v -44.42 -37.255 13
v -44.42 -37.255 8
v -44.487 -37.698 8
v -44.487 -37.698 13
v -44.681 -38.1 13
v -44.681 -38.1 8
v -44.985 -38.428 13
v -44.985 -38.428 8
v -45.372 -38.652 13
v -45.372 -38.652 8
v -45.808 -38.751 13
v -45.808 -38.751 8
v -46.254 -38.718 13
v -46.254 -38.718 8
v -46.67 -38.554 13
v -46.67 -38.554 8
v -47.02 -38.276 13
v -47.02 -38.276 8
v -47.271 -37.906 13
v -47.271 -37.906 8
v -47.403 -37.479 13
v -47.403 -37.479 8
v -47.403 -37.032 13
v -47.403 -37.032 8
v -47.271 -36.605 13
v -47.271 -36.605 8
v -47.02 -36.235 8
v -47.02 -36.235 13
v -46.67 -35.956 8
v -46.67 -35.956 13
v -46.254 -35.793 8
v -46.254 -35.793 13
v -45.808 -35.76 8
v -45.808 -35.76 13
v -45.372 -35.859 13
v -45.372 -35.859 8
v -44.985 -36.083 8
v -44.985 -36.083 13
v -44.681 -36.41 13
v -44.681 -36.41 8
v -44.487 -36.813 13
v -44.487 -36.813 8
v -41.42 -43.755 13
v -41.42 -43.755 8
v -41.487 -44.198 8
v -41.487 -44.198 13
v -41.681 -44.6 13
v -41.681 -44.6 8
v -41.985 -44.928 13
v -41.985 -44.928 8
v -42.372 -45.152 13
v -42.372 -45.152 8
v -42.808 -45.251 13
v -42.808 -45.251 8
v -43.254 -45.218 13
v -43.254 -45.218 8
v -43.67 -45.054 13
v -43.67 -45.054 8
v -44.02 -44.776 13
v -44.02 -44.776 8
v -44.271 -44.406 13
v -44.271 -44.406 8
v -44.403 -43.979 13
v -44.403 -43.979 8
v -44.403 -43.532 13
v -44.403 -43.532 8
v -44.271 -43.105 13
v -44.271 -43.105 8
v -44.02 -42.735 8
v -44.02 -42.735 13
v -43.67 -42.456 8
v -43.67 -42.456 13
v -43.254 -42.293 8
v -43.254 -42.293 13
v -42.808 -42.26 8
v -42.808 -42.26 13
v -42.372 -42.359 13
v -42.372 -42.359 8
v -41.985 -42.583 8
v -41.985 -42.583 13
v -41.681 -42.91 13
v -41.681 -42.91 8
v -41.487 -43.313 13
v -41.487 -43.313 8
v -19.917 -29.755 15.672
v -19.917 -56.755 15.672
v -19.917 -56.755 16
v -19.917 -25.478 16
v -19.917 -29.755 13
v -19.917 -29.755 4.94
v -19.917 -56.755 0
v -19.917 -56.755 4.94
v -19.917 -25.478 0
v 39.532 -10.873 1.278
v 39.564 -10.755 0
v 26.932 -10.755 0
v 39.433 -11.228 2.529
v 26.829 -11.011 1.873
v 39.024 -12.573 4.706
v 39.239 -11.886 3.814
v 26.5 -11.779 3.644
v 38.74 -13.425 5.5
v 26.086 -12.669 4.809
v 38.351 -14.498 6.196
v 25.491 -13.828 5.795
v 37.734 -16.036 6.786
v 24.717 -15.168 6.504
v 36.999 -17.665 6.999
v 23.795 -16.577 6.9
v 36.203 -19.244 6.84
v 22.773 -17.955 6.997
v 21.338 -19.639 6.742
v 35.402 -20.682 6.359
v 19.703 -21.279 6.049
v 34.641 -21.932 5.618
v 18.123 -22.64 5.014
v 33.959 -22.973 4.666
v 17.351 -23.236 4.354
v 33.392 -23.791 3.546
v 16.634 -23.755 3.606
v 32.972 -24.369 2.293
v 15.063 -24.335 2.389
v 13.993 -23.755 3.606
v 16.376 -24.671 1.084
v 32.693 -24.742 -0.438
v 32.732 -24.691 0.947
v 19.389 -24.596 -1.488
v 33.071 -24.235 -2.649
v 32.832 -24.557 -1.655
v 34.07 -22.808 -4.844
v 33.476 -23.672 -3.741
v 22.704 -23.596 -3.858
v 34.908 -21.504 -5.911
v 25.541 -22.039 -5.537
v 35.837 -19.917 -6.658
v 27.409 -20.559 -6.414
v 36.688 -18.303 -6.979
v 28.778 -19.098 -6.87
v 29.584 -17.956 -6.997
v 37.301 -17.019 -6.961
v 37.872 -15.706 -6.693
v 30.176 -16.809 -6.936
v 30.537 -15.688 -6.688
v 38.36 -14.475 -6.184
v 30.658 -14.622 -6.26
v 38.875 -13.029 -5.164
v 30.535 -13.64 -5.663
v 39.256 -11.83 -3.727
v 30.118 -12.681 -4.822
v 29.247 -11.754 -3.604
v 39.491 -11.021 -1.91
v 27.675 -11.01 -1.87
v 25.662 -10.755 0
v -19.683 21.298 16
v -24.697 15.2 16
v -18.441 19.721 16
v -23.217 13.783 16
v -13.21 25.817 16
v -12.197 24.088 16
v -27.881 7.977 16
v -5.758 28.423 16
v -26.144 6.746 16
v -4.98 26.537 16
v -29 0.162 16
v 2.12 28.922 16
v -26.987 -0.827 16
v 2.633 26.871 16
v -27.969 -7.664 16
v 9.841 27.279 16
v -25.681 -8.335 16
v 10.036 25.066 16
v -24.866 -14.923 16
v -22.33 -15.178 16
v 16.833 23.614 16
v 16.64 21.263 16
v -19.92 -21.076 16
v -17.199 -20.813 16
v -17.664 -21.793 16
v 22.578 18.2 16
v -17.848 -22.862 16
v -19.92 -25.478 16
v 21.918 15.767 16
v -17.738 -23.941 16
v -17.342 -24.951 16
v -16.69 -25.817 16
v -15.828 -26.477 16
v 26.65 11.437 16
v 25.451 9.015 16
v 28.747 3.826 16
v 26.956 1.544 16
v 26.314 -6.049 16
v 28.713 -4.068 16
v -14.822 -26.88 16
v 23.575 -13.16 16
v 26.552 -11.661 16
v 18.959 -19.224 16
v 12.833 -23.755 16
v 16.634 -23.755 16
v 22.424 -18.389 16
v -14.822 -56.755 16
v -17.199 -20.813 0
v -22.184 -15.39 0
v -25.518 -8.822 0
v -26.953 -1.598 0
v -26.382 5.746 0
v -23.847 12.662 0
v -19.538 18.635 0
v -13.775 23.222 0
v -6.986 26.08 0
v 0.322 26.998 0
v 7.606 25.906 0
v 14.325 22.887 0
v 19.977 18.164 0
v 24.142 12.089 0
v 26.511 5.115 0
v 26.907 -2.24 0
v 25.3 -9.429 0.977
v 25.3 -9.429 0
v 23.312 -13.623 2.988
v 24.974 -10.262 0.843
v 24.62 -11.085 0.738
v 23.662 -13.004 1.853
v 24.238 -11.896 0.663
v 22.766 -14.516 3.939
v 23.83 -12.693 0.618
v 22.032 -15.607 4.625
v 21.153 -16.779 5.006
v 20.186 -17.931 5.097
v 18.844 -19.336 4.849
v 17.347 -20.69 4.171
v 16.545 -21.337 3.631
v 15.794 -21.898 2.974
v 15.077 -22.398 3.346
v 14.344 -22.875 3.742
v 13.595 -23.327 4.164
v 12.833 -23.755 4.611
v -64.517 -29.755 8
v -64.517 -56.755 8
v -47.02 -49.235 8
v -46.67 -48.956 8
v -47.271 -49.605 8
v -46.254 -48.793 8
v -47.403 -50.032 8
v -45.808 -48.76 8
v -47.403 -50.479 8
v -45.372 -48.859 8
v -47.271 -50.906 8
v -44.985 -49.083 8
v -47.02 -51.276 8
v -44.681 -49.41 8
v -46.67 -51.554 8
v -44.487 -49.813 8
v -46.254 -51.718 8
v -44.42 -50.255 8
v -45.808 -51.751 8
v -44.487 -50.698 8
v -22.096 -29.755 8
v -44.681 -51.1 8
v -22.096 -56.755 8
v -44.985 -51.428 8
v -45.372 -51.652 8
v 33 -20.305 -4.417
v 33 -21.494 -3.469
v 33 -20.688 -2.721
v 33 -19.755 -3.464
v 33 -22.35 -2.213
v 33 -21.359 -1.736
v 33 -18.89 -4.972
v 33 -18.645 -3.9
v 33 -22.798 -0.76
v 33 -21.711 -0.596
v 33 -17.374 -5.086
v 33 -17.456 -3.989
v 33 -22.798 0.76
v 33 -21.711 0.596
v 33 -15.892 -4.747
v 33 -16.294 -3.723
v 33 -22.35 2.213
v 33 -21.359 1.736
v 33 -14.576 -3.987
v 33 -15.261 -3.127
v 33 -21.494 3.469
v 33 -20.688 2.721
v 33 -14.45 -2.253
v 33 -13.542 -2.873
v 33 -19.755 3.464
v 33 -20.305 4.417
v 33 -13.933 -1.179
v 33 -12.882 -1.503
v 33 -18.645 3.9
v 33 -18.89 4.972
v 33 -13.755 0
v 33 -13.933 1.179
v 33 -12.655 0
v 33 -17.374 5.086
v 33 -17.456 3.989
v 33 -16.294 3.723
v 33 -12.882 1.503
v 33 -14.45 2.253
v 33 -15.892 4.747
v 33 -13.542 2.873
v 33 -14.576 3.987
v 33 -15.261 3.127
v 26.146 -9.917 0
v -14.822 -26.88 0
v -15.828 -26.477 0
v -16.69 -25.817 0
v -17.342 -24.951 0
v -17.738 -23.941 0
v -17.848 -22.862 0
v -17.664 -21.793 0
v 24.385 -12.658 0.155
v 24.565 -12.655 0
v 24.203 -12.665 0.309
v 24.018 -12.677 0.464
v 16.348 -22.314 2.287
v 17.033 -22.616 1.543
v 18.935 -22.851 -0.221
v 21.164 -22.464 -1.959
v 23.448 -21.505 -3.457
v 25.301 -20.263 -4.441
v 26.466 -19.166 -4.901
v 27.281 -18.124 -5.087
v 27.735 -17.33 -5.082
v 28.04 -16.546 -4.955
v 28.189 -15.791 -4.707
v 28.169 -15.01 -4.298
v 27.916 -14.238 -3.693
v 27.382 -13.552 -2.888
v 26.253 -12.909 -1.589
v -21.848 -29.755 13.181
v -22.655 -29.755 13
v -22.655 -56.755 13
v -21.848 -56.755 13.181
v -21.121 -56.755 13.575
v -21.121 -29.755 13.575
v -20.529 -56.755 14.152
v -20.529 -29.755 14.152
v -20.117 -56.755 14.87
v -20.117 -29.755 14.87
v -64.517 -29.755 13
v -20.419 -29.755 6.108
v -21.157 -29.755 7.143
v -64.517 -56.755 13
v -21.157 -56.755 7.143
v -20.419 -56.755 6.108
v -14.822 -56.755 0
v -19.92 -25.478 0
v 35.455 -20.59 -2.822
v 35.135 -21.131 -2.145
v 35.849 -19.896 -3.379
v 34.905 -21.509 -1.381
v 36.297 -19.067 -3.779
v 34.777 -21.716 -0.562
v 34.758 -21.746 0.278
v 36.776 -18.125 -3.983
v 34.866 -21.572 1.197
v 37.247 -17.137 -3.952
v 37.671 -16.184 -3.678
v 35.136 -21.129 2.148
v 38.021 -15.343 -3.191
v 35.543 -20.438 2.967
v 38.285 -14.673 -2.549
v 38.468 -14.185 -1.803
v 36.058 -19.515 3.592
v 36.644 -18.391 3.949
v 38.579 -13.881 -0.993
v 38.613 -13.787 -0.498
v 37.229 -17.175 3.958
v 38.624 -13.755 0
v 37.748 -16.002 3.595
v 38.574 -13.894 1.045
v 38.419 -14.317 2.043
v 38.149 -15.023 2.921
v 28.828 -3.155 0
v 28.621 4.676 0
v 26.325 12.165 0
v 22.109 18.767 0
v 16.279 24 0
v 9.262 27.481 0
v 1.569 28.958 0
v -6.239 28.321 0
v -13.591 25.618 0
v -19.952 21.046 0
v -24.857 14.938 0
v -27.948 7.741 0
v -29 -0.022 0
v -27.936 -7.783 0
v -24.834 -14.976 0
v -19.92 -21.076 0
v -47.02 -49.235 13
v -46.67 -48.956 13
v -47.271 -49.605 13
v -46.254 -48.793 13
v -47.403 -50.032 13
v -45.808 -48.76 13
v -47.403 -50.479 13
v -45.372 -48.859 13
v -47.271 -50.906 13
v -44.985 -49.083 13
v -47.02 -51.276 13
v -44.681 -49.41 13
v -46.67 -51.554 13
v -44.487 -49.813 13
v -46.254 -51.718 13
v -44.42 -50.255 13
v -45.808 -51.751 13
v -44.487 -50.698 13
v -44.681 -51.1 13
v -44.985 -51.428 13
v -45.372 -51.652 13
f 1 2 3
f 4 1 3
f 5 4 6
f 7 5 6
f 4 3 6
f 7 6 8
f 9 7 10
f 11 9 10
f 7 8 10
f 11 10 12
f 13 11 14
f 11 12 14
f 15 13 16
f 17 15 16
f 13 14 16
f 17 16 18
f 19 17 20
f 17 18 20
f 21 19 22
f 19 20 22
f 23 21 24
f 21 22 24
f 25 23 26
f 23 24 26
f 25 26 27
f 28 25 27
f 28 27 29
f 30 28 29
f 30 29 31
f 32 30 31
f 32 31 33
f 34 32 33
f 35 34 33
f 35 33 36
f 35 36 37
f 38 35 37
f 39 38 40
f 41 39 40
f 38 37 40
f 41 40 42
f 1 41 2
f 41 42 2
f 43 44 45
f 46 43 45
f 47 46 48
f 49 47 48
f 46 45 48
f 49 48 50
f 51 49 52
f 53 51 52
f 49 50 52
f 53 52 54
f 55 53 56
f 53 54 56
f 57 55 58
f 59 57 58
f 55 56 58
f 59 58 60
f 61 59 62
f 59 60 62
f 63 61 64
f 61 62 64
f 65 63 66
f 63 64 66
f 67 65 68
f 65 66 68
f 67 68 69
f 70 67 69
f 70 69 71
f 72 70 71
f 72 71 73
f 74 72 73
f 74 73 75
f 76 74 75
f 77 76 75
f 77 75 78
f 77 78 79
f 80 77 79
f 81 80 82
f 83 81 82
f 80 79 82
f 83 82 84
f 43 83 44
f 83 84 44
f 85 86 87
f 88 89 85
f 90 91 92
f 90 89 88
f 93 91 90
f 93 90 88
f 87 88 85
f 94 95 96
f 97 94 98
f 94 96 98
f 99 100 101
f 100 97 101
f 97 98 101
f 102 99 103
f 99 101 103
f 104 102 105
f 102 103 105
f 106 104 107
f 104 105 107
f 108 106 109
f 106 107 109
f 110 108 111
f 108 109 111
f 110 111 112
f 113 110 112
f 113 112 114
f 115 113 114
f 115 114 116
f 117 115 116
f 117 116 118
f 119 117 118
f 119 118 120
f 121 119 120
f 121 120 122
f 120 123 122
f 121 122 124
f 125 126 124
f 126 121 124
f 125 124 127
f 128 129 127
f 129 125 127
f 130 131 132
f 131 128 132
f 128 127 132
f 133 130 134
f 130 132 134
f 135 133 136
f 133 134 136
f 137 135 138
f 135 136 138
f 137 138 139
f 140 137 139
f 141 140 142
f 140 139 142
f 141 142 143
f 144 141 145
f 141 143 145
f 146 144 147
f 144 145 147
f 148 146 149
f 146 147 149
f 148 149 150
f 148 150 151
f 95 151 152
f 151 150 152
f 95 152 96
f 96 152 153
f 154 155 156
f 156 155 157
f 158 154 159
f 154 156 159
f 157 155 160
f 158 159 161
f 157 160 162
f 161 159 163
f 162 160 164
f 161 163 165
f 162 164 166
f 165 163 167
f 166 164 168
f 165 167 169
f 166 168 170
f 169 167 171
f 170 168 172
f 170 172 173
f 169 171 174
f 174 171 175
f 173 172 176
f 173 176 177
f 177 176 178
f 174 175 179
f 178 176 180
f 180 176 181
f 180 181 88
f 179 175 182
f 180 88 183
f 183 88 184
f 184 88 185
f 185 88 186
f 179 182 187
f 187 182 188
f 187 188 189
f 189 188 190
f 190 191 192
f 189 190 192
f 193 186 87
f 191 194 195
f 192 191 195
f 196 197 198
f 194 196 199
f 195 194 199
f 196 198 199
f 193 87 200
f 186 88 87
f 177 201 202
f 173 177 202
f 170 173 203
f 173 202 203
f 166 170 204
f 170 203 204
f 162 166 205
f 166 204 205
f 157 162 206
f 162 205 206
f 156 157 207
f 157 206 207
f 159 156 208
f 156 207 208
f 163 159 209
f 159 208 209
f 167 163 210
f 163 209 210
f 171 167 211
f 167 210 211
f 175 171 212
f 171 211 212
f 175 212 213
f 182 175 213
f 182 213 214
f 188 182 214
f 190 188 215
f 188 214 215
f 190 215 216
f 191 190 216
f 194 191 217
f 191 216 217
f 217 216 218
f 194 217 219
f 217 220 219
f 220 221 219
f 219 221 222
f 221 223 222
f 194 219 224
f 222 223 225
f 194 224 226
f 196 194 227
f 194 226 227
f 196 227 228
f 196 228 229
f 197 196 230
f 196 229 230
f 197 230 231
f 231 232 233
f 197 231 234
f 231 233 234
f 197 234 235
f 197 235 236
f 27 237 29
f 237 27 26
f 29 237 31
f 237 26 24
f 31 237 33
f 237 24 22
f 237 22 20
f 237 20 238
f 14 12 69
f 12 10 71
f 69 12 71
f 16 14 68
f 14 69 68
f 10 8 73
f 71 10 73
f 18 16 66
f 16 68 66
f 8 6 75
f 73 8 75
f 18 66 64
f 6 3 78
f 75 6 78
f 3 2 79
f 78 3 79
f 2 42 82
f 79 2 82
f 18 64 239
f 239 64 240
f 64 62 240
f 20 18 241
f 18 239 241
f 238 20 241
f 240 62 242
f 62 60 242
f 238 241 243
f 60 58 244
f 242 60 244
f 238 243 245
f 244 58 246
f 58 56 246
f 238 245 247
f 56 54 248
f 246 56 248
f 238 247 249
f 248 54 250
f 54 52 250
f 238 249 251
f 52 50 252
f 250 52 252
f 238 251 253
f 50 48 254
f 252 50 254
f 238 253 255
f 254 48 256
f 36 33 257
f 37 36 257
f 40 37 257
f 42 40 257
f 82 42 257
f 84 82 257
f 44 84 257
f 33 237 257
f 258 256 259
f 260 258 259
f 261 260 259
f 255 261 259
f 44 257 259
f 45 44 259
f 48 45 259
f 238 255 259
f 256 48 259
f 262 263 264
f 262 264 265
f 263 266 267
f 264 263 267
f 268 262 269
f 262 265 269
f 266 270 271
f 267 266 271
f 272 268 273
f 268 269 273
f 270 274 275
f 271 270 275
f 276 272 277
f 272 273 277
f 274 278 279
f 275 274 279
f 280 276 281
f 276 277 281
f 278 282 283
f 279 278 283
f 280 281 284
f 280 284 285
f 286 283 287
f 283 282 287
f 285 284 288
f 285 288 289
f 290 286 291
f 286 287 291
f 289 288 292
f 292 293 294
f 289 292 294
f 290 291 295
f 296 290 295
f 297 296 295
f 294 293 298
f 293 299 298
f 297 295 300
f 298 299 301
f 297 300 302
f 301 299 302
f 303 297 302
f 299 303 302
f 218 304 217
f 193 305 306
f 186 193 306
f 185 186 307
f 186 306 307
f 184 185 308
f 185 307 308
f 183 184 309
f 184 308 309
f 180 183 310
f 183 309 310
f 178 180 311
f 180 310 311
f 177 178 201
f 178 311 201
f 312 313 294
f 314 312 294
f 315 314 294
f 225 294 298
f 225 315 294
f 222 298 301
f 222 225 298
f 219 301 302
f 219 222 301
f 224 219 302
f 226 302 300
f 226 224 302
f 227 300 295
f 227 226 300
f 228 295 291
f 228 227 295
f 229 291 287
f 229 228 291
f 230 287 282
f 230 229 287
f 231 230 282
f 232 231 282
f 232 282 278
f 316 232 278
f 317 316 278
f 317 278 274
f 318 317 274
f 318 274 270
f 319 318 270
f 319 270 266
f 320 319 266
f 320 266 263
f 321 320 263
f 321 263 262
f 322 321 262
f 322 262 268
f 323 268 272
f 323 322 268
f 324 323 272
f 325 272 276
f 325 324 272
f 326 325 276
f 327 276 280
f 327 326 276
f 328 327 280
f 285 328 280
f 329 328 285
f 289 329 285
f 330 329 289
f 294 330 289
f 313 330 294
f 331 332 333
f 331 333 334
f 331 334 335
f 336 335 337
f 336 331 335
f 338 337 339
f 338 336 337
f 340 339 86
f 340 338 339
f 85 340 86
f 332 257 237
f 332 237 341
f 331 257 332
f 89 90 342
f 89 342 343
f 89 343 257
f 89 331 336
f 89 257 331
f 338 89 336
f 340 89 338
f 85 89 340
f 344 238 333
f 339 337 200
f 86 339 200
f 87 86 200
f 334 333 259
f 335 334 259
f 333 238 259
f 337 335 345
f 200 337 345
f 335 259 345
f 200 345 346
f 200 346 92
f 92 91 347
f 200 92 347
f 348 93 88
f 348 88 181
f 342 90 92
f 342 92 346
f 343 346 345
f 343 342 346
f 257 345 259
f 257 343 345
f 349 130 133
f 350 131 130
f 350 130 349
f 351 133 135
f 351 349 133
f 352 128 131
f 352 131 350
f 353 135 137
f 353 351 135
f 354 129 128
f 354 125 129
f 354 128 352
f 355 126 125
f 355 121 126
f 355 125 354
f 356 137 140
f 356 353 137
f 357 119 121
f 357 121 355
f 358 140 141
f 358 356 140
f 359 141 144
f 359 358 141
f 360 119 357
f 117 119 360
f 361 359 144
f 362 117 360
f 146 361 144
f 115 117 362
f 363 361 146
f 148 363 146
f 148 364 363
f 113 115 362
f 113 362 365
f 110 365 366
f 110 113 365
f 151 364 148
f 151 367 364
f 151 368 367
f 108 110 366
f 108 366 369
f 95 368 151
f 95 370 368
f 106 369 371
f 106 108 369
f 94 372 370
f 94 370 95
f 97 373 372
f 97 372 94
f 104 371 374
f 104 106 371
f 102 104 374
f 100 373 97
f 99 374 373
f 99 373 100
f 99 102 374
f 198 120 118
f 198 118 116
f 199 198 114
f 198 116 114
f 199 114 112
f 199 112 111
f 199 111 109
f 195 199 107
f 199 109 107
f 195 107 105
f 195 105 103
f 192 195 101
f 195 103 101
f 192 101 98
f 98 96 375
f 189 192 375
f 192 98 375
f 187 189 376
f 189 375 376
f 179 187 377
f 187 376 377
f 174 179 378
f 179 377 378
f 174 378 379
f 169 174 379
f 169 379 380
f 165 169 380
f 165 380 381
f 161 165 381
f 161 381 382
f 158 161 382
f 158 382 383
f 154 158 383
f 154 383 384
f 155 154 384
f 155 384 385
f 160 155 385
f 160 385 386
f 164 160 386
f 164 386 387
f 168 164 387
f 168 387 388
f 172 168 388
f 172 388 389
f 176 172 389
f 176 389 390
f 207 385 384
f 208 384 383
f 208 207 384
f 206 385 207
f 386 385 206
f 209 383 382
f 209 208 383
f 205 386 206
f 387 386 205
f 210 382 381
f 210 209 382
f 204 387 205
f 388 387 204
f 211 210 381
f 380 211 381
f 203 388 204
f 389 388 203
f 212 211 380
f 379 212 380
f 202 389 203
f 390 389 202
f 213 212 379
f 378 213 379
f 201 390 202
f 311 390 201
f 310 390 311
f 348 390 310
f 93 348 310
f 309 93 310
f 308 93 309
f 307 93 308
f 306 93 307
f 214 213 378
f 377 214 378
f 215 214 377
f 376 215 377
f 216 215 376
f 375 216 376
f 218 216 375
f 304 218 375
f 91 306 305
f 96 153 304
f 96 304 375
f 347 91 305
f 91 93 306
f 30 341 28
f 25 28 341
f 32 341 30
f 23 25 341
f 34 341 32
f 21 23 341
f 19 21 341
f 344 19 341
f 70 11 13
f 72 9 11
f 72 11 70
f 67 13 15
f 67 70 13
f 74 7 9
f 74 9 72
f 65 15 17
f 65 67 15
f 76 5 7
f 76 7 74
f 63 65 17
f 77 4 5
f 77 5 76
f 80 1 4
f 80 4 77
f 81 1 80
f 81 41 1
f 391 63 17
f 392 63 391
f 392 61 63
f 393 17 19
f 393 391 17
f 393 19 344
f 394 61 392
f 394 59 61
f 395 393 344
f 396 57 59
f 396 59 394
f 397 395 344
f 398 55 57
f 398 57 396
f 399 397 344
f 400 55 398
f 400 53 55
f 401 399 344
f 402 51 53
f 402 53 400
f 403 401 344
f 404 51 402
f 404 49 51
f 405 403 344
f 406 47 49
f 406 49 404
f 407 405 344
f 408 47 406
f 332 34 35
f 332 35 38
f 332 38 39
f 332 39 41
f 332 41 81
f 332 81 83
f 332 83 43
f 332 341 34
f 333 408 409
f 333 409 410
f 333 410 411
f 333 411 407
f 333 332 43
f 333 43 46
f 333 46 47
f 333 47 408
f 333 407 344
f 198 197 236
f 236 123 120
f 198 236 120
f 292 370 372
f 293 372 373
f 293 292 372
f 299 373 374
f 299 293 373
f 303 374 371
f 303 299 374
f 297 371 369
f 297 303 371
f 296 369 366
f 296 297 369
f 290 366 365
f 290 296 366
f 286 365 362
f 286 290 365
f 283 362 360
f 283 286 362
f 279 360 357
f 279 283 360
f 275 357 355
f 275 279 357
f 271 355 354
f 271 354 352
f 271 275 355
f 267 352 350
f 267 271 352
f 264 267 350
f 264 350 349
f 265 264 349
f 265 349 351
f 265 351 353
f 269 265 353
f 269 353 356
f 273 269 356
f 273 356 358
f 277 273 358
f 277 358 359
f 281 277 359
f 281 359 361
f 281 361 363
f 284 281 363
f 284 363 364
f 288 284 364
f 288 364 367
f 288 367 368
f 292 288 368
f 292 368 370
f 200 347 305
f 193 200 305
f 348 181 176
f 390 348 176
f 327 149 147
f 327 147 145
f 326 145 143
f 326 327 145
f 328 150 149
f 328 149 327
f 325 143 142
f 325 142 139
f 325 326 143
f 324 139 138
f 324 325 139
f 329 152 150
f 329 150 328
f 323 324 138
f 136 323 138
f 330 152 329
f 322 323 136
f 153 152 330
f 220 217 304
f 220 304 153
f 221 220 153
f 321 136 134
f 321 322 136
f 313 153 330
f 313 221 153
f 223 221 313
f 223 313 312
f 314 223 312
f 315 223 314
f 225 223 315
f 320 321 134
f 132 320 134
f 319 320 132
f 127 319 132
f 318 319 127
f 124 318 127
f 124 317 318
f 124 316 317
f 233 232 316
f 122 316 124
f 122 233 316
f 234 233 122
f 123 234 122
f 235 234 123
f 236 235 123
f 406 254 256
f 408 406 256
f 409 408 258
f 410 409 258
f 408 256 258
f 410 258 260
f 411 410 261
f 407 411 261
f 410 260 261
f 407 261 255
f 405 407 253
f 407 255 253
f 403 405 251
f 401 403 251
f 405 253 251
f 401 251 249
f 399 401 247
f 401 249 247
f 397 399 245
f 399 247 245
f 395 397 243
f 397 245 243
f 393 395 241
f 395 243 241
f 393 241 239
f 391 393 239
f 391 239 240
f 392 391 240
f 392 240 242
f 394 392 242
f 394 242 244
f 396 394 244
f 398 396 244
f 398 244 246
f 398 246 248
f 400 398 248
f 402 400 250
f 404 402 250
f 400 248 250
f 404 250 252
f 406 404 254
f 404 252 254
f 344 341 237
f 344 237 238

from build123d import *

# Parameters (mm, degrees)
PAD026_DEPTH         = 16
SKETCH047_W          = 36.5505813425
SKETCH047_H          = 33
PAD027_DEPTH         = 16
SKETCH049_W          = 27
SKETCH049_H          = 5
PAD028_DEPTH         = 44.6
SKETCH048_W          = 33.1432370811
SKETCH048_H          = 35
POCKET031_DEPTH      = 16
SKETCH062_R          = 7
PAD029_DEPTH         = 40
SKETCH063_R          = 4
POCKET032_DEPTH      = 42
SKETCH065_R          = 5.1
POCKET033_DEPTH      = 33
SKETCH067_R          = 27
POCKET034_DEPTH      = 16
POCKET034_DEPTH_BACK = 16
POCKET050_DEPTH      = 23
PAD044_DEPTH         = 16
PAD045_DEPTH         = 26
PAD045_DEPTH_BACK    = 1
PAD046_DEPTH         = 26
PAD046_DEPTH_BACK    = 1
SKETCH099_R          = 1.5
POCKET051_DEPTH      = 5
SKETCH068_W          = 20.6
SKETCH068_H          = 23
POCKET052_DEPTH      = 7
SKETCH070_R          = 4
POCKET053_DEPTH      = 16


with BuildPart() as part:
    # Sketch045 → Pad026 (new body)
    with BuildSketch(Plane.XY):
        with BuildLine():
            ThreePointArc((16.6337166542, -23.7554092844), (0, 29), (-16.6337166542, -23.7554092844))
            Line((-16.6337166542, -23.7554092844), (16.6337166542, -23.7554092844))
        make_face()
    extrude(amount=PAD026_DEPTH)

    # Sketch047 → Pad027 (join)
    with BuildSketch(Plane.XY):
        with Locations((-1.6415607576, -40.2554)):
            Rectangle(SKETCH047_W, SKETCH047_H)
    extrude(amount=PAD027_DEPTH)

    # Sketch049 → Pad028 (join)
    with BuildSketch(Plane(origin=(-19.9168514289, 0, 0), x_dir=(0, -1, 0), z_dir=(-1, 0, 0))):
        with Locations((43.2554, 10.5)):
            Rectangle(SKETCH049_W, SKETCH049_H)
    extrude(amount=PAD028_DEPTH)

    # Sketch048 → Pocket031 (cut)
    with BuildSketch(Plane.XY):
        with Locations((1.7499799388, -41.2554)):
            Rectangle(SKETCH048_W, SKETCH048_H)
    extrude(amount=POCKET031_DEPTH, mode=Mode.SUBTRACT)

    # Sketch062 → Pad029 (join)
    with BuildSketch(Plane.YZ):
        with Locations((-17.7554, 0)):
            Circle(SKETCH062_R)
    extrude(amount=PAD029_DEPTH)

    # Sketch063 → Pocket032 (cut)
    with BuildSketch(Plane.YZ):
        with Locations((-17.7554, 0)):
            Circle(SKETCH063_R)
    extrude(amount=POCKET032_DEPTH, mode=Mode.SUBTRACT)

    # Sketch065 → Pocket033 (cut)
    with BuildSketch(Plane.YZ):
        with Locations((-17.7554, 0)):
            Circle(SKETCH065_R)
    extrude(amount=POCKET033_DEPTH, mode=Mode.SUBTRACT)

    # Sketch067 → Pocket034 (cut, two sides)
    with BuildSketch(Plane(origin=(0, 0, 0), x_dir=(1, 0, 0), z_dir=(0, 0, -1))) as pocket034_sk:
        Circle(SKETCH067_R)
    extrude(amount=-POCKET034_DEPTH, mode=Mode.SUBTRACT)
    extrude(pocket034_sk.sketch, amount=POCKET034_DEPTH_BACK, mode=Mode.SUBTRACT)

    # Sketch069 → Pocket050 (cut)
    with BuildSketch(Plane.XY.offset(16)):
        with BuildLine():
            ThreePointArc((21.7394688414, -34.7619834661), (34.6744517723, -21.8788115374), (40.7345717373, -4.6577532545))
            Line((40.7345717373, -4.6577532545), (77.483603, -4.6577532545))
            Line((77.483603, -4.6577532545), (77.483603, -35.651409))
            Line((21.7394688414, -34.7619834661), (77.483603, -35.651409))
        make_face()
    extrude(amount=-POCKET050_DEPTH, mode=Mode.SUBTRACT)

    # Sketch072 → Pad044 (join)
    with BuildSketch(Plane(origin=(0, 0, 0), x_dir=(1, 0, 0), z_dir=(0, 0, -1))):
        Polygon((-19.92, 25.478123), (-19.92, 19.578123), (-15.1, 25.478123), align=None)
    extrude(amount=-PAD044_DEPTH)

    # Sketch101 → Pad045 (join, two sides)
    with BuildSketch(Plane.XZ.offset(55.7554)) as pad045_sk:
        with BuildLine():
            ThreePointArc((-23.0890778045, 12.9959643316), (-20.9165956412, 13.739198554), (-19.9059643934, 15.8009212171))
            Line((-19.9059643933, 15.8009212171), (-17.161644, 10.394013))
            Line((-23.0890778045, 12.9959643316), (-17.161644, 10.394013))
        make_face()
    extrude(amount=-PAD045_DEPTH)
    extrude(pad045_sk.sketch, amount=PAD045_DEPTH_BACK)

    # Sketch100 → Pad046 (join, two sides)
    with BuildSketch(Plane.XZ.offset(55.7554)) as pad046_sk:
        with BuildLine():
            ThreePointArc((-19.6511636096, 2.9781881147), (-21.3108750101, 7.3106091304), (-25.5643652158, 9.1632652939))
            Line((-25.564365, 9.163265), (-16.937498, 9.628842))
            Line((-19.651164, 2.978188), (-16.937498, 9.628842))
        make_face()
    extrude(amount=-PAD046_DEPTH)
    extrude(pad046_sk.sketch, amount=PAD046_DEPTH_BACK)

    # Sketch099 → Pocket051 (cut)
    with BuildSketch(Plane(origin=(0, 0, 8), x_dir=(1, 0, 0), z_dir=(0, 0, -1))):
        with Locations((-45.92, 37.2554)):
            Circle(SKETCH099_R)
        with Locations((-45.92, 50.2554)):
            Circle(SKETCH099_R)
        with Locations((-42.92, 43.7554)):
            Circle(SKETCH099_R)
    extrude(amount=-POCKET051_DEPTH, mode=Mode.SUBTRACT)

    # Sketch068 (on DatumPlane) → Pocket052 (cut)
    with BuildSketch(Plane(origin=(24.3662700863, -13, 0), x_dir=(-0.5, -0.8660254038, 0), z_dir=(-0.6123724357, 0.3535533906, -0.7071067812))):
        with Locations((6.74, -3)):
            Rectangle(SKETCH068_W, SKETCH068_H)
    extrude(amount=POCKET052_DEPTH, mode=Mode.SUBTRACT)

    # Sketch070 → Pocket053 (cut)
    with BuildSketch(Plane(origin=(0, 0, 0), x_dir=(1, 0, 0), z_dir=(0, 0, -1))):
        with Locations((-13.85, 23)):
            Circle(SKETCH070_R)
    extrude(amount=-POCKET053_DEPTH, mode=Mode.SUBTRACT)


solid = part.part
